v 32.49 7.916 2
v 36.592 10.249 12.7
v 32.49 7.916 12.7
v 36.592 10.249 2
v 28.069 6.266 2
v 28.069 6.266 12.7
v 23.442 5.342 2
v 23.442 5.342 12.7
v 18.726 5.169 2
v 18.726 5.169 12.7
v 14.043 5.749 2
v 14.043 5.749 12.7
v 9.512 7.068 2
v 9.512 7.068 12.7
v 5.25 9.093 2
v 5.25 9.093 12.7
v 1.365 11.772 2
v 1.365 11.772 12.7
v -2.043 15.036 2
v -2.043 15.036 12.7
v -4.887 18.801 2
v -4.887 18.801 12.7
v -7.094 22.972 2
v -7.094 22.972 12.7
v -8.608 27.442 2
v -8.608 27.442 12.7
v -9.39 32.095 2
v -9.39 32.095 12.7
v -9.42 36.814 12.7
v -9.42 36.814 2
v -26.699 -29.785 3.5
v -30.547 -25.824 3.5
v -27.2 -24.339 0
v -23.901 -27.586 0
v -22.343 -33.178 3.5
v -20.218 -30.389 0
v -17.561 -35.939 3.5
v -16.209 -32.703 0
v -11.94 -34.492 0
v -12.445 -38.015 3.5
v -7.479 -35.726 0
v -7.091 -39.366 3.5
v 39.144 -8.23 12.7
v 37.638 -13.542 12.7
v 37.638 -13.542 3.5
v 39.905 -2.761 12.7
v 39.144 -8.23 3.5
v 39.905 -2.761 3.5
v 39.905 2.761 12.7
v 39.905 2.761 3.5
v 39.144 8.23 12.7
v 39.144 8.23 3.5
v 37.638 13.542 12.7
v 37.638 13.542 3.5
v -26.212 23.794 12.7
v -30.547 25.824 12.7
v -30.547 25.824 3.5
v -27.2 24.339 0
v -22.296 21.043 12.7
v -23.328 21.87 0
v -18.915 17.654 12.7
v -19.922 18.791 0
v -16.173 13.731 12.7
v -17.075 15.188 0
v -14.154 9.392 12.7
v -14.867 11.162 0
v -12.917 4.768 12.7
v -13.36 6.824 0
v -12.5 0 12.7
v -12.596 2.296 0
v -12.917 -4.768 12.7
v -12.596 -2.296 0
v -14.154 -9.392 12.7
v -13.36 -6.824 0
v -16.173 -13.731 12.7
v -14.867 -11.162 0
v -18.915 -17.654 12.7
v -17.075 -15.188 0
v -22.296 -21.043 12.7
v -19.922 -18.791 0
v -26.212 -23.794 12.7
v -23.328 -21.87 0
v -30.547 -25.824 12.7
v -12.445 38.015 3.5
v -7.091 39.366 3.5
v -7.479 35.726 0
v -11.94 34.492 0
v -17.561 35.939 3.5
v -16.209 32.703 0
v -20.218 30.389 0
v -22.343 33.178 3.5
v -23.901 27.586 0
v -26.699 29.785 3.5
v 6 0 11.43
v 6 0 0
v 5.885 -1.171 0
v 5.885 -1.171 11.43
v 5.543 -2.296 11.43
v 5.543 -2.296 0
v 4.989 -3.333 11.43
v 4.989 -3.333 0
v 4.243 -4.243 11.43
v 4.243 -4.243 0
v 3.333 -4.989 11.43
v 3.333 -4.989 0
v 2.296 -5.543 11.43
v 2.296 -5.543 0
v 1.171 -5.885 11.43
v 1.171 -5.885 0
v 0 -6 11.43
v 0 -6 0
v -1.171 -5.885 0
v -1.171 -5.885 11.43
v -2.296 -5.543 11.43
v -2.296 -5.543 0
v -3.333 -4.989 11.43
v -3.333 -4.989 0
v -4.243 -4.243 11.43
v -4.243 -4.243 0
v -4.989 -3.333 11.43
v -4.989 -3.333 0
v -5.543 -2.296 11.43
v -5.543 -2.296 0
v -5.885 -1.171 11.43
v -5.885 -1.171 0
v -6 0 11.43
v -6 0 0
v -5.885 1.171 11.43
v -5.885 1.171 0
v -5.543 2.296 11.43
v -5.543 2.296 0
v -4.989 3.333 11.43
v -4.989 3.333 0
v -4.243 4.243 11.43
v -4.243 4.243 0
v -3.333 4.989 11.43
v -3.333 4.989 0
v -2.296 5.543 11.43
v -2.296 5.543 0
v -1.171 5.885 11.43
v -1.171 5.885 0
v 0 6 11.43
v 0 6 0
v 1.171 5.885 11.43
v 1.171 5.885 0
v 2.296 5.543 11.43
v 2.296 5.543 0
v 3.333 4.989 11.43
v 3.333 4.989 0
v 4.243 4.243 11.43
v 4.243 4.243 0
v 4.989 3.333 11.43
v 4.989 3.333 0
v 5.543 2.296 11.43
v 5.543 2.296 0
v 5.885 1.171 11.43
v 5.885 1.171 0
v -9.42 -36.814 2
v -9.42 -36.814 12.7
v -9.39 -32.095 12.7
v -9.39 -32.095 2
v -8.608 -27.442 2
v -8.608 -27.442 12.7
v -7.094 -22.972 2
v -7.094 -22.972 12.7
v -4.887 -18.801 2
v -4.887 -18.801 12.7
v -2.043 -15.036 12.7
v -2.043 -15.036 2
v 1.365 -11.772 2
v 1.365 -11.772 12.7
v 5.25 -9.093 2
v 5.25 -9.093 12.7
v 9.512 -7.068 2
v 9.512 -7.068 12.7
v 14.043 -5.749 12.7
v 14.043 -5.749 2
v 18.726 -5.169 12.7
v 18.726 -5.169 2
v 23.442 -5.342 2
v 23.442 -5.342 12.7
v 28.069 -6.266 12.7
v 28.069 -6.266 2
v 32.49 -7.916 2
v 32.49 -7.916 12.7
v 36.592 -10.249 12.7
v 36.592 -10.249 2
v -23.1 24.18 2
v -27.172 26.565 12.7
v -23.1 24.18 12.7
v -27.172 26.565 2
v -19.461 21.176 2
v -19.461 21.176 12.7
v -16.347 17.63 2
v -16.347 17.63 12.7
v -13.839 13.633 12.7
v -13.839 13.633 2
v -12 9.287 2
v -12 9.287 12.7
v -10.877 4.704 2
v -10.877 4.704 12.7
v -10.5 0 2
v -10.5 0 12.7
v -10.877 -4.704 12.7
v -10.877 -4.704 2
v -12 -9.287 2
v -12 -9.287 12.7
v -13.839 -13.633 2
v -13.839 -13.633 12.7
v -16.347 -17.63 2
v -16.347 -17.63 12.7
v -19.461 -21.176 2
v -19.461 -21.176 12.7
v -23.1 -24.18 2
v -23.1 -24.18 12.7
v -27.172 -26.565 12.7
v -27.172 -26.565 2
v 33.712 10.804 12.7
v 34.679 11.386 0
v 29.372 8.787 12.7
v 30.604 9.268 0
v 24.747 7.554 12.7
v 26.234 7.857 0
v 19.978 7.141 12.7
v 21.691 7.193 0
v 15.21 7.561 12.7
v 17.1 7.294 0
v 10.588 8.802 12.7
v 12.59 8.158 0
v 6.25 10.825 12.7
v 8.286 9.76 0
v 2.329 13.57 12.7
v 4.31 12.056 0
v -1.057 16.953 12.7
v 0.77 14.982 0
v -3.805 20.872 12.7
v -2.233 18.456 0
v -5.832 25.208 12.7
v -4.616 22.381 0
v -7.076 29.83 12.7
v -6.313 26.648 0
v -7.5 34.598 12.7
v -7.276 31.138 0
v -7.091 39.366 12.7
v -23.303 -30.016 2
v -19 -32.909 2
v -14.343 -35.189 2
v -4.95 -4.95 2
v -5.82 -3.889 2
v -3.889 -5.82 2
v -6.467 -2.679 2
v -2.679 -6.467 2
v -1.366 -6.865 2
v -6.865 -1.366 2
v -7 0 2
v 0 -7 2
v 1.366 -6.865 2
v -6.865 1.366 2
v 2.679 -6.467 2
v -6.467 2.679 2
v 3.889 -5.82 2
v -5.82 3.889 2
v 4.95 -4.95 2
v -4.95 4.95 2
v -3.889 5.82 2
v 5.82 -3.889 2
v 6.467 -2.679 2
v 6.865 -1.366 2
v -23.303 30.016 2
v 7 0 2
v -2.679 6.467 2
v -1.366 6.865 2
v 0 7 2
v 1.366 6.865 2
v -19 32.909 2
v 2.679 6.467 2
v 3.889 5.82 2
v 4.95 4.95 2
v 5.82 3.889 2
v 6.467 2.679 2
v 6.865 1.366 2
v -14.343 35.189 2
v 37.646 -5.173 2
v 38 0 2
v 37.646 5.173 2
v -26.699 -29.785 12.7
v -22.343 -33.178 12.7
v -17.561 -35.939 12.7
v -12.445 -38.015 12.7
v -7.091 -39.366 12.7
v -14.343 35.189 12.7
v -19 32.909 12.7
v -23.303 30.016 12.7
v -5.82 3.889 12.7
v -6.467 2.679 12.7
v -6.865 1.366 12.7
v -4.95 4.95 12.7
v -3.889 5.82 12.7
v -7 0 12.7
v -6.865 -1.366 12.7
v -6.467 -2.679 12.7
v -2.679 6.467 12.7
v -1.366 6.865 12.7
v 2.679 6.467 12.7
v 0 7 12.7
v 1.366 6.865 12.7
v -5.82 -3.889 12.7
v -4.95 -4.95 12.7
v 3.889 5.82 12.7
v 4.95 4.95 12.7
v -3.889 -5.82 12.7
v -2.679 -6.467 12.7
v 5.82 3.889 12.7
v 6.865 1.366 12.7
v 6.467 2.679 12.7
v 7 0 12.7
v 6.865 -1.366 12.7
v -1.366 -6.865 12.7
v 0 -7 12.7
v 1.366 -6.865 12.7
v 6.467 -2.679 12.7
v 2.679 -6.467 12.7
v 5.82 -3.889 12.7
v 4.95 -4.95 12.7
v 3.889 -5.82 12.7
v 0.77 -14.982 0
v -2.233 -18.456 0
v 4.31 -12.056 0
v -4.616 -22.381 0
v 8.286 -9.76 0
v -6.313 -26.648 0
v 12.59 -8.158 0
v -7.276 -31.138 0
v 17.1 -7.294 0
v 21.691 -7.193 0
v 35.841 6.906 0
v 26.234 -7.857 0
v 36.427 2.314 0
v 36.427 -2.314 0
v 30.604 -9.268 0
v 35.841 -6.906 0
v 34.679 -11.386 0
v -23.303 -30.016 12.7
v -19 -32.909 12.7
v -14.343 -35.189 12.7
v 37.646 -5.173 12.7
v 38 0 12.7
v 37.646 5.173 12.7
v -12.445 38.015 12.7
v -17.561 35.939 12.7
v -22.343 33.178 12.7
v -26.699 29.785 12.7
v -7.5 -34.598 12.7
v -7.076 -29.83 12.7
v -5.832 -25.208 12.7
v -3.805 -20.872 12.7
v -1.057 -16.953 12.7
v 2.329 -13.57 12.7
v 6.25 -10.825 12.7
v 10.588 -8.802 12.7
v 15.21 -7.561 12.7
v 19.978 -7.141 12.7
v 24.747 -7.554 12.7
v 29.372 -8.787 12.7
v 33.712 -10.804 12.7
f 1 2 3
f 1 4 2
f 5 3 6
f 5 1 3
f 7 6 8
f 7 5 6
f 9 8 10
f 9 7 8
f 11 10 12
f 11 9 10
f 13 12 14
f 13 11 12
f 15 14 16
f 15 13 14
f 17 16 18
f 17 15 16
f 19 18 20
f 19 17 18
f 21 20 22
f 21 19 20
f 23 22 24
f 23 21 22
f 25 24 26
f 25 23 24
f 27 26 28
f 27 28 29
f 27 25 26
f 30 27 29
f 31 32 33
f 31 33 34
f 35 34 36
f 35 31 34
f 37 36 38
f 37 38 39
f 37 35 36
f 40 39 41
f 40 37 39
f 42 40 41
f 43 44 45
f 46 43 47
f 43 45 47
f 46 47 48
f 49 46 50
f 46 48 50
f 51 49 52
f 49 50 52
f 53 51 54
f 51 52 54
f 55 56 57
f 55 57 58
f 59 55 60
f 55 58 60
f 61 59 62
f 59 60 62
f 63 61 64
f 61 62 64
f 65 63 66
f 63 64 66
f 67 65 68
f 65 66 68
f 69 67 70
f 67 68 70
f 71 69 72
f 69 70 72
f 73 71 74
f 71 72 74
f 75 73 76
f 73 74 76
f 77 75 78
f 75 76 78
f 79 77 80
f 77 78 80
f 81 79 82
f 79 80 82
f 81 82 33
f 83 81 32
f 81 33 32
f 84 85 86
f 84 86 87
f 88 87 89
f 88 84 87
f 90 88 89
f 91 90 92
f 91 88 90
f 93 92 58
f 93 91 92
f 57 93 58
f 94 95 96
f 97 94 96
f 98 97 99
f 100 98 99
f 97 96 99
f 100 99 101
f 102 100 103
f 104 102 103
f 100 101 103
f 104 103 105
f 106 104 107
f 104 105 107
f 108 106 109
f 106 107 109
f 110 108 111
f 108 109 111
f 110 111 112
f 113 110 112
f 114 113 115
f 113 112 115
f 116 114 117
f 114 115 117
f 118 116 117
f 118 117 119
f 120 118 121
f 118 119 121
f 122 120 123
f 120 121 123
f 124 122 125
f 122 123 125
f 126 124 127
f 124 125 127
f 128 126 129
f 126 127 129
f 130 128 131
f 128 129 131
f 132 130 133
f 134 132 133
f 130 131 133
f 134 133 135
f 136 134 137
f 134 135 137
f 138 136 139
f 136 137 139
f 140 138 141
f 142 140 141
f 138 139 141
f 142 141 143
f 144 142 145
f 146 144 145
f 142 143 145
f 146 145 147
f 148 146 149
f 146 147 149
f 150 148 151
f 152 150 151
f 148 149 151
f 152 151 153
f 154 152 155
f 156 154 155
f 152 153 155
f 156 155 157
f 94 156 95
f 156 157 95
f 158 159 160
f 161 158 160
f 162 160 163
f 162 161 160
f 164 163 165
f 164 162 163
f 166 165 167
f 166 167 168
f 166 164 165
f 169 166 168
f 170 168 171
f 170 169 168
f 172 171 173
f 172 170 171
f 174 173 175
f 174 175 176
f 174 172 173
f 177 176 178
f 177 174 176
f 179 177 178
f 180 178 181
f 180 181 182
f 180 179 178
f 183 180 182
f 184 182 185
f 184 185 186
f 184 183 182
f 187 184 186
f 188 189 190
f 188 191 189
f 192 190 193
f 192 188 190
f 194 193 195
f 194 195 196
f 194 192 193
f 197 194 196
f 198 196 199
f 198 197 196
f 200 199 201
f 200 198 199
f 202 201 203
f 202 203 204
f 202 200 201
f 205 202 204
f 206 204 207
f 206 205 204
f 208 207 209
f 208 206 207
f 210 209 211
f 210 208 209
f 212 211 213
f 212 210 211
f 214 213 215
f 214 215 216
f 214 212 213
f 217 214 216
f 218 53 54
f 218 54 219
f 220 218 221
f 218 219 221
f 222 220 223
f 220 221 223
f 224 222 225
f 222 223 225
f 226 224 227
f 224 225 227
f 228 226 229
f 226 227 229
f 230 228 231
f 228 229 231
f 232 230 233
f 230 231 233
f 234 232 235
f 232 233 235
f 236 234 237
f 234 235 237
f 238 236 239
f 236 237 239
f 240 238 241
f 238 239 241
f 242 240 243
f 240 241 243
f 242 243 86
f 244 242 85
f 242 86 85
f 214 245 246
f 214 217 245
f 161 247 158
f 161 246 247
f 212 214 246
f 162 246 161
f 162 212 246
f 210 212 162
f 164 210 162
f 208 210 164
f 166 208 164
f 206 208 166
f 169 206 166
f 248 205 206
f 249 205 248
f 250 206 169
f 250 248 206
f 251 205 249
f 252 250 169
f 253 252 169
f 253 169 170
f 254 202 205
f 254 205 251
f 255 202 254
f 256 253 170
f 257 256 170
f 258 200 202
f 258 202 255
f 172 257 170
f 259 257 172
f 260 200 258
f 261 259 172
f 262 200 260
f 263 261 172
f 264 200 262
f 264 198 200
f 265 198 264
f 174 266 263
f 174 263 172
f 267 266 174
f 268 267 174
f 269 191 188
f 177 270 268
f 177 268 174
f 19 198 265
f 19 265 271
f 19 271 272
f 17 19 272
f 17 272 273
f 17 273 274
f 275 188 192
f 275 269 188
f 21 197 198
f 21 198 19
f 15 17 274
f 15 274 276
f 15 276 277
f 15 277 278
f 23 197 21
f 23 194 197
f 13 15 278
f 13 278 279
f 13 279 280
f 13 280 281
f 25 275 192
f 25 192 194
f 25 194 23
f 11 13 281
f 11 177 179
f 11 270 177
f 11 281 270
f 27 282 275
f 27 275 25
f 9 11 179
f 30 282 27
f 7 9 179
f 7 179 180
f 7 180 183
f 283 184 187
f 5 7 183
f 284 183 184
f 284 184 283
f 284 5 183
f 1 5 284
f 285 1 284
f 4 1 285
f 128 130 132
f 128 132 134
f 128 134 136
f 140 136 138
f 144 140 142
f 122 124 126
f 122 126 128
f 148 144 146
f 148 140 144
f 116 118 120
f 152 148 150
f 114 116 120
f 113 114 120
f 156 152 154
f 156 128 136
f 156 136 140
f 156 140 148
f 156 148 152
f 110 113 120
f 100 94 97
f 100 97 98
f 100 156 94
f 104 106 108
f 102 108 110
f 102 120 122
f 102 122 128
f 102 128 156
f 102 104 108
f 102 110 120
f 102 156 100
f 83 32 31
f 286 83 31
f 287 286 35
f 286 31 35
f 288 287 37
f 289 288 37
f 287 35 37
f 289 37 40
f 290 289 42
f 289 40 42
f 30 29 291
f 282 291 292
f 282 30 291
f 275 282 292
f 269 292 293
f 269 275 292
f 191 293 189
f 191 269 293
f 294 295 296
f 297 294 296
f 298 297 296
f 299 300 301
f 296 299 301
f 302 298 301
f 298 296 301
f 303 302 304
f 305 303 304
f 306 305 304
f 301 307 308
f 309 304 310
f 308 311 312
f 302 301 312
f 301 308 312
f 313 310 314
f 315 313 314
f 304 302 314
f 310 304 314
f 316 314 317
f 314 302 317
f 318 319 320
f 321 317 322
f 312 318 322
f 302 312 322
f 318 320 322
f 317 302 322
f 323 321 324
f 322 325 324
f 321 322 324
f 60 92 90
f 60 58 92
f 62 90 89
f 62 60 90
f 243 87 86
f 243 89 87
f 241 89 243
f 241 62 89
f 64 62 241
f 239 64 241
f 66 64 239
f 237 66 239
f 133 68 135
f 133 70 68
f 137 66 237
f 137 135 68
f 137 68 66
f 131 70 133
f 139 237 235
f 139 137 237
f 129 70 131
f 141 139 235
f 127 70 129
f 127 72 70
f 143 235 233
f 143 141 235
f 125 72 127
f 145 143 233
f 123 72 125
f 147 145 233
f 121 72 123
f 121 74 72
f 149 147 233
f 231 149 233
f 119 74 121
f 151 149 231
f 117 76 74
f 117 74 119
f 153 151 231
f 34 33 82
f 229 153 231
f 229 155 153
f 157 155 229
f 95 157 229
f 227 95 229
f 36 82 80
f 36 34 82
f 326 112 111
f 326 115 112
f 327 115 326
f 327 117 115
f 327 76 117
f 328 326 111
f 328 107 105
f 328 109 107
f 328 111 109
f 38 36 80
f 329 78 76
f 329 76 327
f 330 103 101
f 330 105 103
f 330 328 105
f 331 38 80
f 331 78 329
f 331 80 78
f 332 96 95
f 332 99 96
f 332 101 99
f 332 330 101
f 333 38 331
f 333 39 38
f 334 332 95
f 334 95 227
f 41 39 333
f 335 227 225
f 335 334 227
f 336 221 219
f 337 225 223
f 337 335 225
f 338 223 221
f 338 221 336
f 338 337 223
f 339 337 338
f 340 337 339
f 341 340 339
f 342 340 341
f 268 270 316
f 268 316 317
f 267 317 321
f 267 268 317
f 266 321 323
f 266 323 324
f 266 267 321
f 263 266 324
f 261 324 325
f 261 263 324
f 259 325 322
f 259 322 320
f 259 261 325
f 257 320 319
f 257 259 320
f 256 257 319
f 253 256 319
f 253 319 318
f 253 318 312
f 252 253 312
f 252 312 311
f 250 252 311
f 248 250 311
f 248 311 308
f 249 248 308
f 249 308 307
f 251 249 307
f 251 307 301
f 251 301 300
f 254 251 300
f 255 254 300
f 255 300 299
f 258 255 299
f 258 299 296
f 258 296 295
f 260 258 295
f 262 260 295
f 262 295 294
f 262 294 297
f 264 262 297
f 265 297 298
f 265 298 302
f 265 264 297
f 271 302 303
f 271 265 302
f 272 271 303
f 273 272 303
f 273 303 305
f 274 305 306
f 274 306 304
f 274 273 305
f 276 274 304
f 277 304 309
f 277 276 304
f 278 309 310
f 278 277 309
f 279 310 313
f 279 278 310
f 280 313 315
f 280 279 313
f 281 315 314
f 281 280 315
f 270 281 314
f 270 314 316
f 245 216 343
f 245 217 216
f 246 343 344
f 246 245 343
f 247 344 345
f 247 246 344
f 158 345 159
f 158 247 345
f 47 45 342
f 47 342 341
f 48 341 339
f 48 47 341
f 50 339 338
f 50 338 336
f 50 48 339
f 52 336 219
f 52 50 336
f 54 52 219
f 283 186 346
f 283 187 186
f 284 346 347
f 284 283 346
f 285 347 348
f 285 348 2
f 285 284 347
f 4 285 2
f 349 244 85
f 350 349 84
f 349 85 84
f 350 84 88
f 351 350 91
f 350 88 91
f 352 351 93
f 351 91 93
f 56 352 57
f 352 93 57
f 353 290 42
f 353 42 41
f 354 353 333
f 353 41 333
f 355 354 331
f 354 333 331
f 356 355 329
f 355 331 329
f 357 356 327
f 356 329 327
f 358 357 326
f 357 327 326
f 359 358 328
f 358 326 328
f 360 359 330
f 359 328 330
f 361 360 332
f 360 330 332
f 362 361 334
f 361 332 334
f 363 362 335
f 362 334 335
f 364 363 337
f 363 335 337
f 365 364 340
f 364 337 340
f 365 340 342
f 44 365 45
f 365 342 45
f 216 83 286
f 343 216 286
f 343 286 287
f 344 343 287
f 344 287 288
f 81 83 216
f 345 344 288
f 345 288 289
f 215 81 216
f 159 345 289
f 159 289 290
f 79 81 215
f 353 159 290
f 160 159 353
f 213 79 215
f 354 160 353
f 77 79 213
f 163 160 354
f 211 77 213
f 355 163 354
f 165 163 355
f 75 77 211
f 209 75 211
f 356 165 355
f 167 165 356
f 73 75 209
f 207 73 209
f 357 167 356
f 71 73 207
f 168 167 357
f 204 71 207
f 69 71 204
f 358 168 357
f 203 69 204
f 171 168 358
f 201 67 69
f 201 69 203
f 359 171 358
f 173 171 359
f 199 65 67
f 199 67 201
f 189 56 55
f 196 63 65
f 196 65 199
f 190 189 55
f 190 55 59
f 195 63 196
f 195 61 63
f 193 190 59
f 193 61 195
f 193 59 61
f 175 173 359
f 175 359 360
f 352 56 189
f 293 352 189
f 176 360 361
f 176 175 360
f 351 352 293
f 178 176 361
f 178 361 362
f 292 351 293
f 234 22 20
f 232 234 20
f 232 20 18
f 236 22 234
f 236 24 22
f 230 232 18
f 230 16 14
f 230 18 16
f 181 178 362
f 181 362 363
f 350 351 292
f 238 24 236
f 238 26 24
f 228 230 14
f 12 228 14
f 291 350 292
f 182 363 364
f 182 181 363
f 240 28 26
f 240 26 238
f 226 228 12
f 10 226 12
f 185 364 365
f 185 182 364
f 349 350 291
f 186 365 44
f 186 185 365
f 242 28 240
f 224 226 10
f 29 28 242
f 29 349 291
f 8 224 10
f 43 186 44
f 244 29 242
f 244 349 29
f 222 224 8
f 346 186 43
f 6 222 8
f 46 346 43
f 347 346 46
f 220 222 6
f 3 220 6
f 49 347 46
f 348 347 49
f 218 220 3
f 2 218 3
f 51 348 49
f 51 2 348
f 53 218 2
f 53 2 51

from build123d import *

# Parameters (mm, degrees)
F1_DEPTH = 12.7
F2_T     = -2
F3_R     = 7
F4_DEPTH = 12.7
F5_R     = 6
F6_DEPTH = 11.43
F7_SIZE  = 3.5


with BuildPart() as f1:
    # F0 (on Top) → F1 (new body)
    with BuildSketch(Plane.XY):
        with BuildLine():
            ThreePointArc((37.637836, 13.542278), (6.25, 10.825318), (-7.090961, 39.366461))
            ThreePointArc((-7.090961, 39.366461), (-20, 34.641016), (-30.546875, 25.824183))
            ThreePointArc((-30.546875, 25.824183), (-12.5, 0), (-30.546875, -25.824183))
            ThreePointArc((-30.546875, -25.824183), (-20, -34.641016), (-7.090961, -39.366461))
            ThreePointArc((-7.090961, -39.366461), (6.25, -10.825318), (37.637836, -13.542278))
            ThreePointArc((37.637836, -13.542278), (40, 0), (37.637836, 13.542278))
        make_face()
    extrude(amount=F1_DEPTH)

    # F2
    f2_openings = [f1.faces().sort_by_distance(p)[0] for p in [
        (0, 0, 12.7),
    ]]
    offset(amount=F2_T, openings=f2_openings)

    # F3 (on face) → F4 (join)
    with BuildSketch(Plane(origin=(0, 0, 0), x_dir=(1, 0, 0), z_dir=(0, 0, -1))):
        Circle(F3_R)
    extrude(amount=-F4_DEPTH)

    # F5 (on face) → F6 (cut)
    with BuildSketch(Plane(origin=(0, 0, 0), x_dir=(1, 0, 0), z_dir=(0, 0, -1))):
        Circle(F5_R)
    extrude(amount=-F6_DEPTH, mode=Mode.SUBTRACT)

    # F7
    f7_edges = [f1.edges().sort_by_distance(p)[0] for p in [
        (40, 0, 0),
        (-20, -34.641016, 0),
        (-20, 34.641016, 0),
    ]]
    chamfer(f7_edges, length=F7_SIZE)


solid = f1.part
